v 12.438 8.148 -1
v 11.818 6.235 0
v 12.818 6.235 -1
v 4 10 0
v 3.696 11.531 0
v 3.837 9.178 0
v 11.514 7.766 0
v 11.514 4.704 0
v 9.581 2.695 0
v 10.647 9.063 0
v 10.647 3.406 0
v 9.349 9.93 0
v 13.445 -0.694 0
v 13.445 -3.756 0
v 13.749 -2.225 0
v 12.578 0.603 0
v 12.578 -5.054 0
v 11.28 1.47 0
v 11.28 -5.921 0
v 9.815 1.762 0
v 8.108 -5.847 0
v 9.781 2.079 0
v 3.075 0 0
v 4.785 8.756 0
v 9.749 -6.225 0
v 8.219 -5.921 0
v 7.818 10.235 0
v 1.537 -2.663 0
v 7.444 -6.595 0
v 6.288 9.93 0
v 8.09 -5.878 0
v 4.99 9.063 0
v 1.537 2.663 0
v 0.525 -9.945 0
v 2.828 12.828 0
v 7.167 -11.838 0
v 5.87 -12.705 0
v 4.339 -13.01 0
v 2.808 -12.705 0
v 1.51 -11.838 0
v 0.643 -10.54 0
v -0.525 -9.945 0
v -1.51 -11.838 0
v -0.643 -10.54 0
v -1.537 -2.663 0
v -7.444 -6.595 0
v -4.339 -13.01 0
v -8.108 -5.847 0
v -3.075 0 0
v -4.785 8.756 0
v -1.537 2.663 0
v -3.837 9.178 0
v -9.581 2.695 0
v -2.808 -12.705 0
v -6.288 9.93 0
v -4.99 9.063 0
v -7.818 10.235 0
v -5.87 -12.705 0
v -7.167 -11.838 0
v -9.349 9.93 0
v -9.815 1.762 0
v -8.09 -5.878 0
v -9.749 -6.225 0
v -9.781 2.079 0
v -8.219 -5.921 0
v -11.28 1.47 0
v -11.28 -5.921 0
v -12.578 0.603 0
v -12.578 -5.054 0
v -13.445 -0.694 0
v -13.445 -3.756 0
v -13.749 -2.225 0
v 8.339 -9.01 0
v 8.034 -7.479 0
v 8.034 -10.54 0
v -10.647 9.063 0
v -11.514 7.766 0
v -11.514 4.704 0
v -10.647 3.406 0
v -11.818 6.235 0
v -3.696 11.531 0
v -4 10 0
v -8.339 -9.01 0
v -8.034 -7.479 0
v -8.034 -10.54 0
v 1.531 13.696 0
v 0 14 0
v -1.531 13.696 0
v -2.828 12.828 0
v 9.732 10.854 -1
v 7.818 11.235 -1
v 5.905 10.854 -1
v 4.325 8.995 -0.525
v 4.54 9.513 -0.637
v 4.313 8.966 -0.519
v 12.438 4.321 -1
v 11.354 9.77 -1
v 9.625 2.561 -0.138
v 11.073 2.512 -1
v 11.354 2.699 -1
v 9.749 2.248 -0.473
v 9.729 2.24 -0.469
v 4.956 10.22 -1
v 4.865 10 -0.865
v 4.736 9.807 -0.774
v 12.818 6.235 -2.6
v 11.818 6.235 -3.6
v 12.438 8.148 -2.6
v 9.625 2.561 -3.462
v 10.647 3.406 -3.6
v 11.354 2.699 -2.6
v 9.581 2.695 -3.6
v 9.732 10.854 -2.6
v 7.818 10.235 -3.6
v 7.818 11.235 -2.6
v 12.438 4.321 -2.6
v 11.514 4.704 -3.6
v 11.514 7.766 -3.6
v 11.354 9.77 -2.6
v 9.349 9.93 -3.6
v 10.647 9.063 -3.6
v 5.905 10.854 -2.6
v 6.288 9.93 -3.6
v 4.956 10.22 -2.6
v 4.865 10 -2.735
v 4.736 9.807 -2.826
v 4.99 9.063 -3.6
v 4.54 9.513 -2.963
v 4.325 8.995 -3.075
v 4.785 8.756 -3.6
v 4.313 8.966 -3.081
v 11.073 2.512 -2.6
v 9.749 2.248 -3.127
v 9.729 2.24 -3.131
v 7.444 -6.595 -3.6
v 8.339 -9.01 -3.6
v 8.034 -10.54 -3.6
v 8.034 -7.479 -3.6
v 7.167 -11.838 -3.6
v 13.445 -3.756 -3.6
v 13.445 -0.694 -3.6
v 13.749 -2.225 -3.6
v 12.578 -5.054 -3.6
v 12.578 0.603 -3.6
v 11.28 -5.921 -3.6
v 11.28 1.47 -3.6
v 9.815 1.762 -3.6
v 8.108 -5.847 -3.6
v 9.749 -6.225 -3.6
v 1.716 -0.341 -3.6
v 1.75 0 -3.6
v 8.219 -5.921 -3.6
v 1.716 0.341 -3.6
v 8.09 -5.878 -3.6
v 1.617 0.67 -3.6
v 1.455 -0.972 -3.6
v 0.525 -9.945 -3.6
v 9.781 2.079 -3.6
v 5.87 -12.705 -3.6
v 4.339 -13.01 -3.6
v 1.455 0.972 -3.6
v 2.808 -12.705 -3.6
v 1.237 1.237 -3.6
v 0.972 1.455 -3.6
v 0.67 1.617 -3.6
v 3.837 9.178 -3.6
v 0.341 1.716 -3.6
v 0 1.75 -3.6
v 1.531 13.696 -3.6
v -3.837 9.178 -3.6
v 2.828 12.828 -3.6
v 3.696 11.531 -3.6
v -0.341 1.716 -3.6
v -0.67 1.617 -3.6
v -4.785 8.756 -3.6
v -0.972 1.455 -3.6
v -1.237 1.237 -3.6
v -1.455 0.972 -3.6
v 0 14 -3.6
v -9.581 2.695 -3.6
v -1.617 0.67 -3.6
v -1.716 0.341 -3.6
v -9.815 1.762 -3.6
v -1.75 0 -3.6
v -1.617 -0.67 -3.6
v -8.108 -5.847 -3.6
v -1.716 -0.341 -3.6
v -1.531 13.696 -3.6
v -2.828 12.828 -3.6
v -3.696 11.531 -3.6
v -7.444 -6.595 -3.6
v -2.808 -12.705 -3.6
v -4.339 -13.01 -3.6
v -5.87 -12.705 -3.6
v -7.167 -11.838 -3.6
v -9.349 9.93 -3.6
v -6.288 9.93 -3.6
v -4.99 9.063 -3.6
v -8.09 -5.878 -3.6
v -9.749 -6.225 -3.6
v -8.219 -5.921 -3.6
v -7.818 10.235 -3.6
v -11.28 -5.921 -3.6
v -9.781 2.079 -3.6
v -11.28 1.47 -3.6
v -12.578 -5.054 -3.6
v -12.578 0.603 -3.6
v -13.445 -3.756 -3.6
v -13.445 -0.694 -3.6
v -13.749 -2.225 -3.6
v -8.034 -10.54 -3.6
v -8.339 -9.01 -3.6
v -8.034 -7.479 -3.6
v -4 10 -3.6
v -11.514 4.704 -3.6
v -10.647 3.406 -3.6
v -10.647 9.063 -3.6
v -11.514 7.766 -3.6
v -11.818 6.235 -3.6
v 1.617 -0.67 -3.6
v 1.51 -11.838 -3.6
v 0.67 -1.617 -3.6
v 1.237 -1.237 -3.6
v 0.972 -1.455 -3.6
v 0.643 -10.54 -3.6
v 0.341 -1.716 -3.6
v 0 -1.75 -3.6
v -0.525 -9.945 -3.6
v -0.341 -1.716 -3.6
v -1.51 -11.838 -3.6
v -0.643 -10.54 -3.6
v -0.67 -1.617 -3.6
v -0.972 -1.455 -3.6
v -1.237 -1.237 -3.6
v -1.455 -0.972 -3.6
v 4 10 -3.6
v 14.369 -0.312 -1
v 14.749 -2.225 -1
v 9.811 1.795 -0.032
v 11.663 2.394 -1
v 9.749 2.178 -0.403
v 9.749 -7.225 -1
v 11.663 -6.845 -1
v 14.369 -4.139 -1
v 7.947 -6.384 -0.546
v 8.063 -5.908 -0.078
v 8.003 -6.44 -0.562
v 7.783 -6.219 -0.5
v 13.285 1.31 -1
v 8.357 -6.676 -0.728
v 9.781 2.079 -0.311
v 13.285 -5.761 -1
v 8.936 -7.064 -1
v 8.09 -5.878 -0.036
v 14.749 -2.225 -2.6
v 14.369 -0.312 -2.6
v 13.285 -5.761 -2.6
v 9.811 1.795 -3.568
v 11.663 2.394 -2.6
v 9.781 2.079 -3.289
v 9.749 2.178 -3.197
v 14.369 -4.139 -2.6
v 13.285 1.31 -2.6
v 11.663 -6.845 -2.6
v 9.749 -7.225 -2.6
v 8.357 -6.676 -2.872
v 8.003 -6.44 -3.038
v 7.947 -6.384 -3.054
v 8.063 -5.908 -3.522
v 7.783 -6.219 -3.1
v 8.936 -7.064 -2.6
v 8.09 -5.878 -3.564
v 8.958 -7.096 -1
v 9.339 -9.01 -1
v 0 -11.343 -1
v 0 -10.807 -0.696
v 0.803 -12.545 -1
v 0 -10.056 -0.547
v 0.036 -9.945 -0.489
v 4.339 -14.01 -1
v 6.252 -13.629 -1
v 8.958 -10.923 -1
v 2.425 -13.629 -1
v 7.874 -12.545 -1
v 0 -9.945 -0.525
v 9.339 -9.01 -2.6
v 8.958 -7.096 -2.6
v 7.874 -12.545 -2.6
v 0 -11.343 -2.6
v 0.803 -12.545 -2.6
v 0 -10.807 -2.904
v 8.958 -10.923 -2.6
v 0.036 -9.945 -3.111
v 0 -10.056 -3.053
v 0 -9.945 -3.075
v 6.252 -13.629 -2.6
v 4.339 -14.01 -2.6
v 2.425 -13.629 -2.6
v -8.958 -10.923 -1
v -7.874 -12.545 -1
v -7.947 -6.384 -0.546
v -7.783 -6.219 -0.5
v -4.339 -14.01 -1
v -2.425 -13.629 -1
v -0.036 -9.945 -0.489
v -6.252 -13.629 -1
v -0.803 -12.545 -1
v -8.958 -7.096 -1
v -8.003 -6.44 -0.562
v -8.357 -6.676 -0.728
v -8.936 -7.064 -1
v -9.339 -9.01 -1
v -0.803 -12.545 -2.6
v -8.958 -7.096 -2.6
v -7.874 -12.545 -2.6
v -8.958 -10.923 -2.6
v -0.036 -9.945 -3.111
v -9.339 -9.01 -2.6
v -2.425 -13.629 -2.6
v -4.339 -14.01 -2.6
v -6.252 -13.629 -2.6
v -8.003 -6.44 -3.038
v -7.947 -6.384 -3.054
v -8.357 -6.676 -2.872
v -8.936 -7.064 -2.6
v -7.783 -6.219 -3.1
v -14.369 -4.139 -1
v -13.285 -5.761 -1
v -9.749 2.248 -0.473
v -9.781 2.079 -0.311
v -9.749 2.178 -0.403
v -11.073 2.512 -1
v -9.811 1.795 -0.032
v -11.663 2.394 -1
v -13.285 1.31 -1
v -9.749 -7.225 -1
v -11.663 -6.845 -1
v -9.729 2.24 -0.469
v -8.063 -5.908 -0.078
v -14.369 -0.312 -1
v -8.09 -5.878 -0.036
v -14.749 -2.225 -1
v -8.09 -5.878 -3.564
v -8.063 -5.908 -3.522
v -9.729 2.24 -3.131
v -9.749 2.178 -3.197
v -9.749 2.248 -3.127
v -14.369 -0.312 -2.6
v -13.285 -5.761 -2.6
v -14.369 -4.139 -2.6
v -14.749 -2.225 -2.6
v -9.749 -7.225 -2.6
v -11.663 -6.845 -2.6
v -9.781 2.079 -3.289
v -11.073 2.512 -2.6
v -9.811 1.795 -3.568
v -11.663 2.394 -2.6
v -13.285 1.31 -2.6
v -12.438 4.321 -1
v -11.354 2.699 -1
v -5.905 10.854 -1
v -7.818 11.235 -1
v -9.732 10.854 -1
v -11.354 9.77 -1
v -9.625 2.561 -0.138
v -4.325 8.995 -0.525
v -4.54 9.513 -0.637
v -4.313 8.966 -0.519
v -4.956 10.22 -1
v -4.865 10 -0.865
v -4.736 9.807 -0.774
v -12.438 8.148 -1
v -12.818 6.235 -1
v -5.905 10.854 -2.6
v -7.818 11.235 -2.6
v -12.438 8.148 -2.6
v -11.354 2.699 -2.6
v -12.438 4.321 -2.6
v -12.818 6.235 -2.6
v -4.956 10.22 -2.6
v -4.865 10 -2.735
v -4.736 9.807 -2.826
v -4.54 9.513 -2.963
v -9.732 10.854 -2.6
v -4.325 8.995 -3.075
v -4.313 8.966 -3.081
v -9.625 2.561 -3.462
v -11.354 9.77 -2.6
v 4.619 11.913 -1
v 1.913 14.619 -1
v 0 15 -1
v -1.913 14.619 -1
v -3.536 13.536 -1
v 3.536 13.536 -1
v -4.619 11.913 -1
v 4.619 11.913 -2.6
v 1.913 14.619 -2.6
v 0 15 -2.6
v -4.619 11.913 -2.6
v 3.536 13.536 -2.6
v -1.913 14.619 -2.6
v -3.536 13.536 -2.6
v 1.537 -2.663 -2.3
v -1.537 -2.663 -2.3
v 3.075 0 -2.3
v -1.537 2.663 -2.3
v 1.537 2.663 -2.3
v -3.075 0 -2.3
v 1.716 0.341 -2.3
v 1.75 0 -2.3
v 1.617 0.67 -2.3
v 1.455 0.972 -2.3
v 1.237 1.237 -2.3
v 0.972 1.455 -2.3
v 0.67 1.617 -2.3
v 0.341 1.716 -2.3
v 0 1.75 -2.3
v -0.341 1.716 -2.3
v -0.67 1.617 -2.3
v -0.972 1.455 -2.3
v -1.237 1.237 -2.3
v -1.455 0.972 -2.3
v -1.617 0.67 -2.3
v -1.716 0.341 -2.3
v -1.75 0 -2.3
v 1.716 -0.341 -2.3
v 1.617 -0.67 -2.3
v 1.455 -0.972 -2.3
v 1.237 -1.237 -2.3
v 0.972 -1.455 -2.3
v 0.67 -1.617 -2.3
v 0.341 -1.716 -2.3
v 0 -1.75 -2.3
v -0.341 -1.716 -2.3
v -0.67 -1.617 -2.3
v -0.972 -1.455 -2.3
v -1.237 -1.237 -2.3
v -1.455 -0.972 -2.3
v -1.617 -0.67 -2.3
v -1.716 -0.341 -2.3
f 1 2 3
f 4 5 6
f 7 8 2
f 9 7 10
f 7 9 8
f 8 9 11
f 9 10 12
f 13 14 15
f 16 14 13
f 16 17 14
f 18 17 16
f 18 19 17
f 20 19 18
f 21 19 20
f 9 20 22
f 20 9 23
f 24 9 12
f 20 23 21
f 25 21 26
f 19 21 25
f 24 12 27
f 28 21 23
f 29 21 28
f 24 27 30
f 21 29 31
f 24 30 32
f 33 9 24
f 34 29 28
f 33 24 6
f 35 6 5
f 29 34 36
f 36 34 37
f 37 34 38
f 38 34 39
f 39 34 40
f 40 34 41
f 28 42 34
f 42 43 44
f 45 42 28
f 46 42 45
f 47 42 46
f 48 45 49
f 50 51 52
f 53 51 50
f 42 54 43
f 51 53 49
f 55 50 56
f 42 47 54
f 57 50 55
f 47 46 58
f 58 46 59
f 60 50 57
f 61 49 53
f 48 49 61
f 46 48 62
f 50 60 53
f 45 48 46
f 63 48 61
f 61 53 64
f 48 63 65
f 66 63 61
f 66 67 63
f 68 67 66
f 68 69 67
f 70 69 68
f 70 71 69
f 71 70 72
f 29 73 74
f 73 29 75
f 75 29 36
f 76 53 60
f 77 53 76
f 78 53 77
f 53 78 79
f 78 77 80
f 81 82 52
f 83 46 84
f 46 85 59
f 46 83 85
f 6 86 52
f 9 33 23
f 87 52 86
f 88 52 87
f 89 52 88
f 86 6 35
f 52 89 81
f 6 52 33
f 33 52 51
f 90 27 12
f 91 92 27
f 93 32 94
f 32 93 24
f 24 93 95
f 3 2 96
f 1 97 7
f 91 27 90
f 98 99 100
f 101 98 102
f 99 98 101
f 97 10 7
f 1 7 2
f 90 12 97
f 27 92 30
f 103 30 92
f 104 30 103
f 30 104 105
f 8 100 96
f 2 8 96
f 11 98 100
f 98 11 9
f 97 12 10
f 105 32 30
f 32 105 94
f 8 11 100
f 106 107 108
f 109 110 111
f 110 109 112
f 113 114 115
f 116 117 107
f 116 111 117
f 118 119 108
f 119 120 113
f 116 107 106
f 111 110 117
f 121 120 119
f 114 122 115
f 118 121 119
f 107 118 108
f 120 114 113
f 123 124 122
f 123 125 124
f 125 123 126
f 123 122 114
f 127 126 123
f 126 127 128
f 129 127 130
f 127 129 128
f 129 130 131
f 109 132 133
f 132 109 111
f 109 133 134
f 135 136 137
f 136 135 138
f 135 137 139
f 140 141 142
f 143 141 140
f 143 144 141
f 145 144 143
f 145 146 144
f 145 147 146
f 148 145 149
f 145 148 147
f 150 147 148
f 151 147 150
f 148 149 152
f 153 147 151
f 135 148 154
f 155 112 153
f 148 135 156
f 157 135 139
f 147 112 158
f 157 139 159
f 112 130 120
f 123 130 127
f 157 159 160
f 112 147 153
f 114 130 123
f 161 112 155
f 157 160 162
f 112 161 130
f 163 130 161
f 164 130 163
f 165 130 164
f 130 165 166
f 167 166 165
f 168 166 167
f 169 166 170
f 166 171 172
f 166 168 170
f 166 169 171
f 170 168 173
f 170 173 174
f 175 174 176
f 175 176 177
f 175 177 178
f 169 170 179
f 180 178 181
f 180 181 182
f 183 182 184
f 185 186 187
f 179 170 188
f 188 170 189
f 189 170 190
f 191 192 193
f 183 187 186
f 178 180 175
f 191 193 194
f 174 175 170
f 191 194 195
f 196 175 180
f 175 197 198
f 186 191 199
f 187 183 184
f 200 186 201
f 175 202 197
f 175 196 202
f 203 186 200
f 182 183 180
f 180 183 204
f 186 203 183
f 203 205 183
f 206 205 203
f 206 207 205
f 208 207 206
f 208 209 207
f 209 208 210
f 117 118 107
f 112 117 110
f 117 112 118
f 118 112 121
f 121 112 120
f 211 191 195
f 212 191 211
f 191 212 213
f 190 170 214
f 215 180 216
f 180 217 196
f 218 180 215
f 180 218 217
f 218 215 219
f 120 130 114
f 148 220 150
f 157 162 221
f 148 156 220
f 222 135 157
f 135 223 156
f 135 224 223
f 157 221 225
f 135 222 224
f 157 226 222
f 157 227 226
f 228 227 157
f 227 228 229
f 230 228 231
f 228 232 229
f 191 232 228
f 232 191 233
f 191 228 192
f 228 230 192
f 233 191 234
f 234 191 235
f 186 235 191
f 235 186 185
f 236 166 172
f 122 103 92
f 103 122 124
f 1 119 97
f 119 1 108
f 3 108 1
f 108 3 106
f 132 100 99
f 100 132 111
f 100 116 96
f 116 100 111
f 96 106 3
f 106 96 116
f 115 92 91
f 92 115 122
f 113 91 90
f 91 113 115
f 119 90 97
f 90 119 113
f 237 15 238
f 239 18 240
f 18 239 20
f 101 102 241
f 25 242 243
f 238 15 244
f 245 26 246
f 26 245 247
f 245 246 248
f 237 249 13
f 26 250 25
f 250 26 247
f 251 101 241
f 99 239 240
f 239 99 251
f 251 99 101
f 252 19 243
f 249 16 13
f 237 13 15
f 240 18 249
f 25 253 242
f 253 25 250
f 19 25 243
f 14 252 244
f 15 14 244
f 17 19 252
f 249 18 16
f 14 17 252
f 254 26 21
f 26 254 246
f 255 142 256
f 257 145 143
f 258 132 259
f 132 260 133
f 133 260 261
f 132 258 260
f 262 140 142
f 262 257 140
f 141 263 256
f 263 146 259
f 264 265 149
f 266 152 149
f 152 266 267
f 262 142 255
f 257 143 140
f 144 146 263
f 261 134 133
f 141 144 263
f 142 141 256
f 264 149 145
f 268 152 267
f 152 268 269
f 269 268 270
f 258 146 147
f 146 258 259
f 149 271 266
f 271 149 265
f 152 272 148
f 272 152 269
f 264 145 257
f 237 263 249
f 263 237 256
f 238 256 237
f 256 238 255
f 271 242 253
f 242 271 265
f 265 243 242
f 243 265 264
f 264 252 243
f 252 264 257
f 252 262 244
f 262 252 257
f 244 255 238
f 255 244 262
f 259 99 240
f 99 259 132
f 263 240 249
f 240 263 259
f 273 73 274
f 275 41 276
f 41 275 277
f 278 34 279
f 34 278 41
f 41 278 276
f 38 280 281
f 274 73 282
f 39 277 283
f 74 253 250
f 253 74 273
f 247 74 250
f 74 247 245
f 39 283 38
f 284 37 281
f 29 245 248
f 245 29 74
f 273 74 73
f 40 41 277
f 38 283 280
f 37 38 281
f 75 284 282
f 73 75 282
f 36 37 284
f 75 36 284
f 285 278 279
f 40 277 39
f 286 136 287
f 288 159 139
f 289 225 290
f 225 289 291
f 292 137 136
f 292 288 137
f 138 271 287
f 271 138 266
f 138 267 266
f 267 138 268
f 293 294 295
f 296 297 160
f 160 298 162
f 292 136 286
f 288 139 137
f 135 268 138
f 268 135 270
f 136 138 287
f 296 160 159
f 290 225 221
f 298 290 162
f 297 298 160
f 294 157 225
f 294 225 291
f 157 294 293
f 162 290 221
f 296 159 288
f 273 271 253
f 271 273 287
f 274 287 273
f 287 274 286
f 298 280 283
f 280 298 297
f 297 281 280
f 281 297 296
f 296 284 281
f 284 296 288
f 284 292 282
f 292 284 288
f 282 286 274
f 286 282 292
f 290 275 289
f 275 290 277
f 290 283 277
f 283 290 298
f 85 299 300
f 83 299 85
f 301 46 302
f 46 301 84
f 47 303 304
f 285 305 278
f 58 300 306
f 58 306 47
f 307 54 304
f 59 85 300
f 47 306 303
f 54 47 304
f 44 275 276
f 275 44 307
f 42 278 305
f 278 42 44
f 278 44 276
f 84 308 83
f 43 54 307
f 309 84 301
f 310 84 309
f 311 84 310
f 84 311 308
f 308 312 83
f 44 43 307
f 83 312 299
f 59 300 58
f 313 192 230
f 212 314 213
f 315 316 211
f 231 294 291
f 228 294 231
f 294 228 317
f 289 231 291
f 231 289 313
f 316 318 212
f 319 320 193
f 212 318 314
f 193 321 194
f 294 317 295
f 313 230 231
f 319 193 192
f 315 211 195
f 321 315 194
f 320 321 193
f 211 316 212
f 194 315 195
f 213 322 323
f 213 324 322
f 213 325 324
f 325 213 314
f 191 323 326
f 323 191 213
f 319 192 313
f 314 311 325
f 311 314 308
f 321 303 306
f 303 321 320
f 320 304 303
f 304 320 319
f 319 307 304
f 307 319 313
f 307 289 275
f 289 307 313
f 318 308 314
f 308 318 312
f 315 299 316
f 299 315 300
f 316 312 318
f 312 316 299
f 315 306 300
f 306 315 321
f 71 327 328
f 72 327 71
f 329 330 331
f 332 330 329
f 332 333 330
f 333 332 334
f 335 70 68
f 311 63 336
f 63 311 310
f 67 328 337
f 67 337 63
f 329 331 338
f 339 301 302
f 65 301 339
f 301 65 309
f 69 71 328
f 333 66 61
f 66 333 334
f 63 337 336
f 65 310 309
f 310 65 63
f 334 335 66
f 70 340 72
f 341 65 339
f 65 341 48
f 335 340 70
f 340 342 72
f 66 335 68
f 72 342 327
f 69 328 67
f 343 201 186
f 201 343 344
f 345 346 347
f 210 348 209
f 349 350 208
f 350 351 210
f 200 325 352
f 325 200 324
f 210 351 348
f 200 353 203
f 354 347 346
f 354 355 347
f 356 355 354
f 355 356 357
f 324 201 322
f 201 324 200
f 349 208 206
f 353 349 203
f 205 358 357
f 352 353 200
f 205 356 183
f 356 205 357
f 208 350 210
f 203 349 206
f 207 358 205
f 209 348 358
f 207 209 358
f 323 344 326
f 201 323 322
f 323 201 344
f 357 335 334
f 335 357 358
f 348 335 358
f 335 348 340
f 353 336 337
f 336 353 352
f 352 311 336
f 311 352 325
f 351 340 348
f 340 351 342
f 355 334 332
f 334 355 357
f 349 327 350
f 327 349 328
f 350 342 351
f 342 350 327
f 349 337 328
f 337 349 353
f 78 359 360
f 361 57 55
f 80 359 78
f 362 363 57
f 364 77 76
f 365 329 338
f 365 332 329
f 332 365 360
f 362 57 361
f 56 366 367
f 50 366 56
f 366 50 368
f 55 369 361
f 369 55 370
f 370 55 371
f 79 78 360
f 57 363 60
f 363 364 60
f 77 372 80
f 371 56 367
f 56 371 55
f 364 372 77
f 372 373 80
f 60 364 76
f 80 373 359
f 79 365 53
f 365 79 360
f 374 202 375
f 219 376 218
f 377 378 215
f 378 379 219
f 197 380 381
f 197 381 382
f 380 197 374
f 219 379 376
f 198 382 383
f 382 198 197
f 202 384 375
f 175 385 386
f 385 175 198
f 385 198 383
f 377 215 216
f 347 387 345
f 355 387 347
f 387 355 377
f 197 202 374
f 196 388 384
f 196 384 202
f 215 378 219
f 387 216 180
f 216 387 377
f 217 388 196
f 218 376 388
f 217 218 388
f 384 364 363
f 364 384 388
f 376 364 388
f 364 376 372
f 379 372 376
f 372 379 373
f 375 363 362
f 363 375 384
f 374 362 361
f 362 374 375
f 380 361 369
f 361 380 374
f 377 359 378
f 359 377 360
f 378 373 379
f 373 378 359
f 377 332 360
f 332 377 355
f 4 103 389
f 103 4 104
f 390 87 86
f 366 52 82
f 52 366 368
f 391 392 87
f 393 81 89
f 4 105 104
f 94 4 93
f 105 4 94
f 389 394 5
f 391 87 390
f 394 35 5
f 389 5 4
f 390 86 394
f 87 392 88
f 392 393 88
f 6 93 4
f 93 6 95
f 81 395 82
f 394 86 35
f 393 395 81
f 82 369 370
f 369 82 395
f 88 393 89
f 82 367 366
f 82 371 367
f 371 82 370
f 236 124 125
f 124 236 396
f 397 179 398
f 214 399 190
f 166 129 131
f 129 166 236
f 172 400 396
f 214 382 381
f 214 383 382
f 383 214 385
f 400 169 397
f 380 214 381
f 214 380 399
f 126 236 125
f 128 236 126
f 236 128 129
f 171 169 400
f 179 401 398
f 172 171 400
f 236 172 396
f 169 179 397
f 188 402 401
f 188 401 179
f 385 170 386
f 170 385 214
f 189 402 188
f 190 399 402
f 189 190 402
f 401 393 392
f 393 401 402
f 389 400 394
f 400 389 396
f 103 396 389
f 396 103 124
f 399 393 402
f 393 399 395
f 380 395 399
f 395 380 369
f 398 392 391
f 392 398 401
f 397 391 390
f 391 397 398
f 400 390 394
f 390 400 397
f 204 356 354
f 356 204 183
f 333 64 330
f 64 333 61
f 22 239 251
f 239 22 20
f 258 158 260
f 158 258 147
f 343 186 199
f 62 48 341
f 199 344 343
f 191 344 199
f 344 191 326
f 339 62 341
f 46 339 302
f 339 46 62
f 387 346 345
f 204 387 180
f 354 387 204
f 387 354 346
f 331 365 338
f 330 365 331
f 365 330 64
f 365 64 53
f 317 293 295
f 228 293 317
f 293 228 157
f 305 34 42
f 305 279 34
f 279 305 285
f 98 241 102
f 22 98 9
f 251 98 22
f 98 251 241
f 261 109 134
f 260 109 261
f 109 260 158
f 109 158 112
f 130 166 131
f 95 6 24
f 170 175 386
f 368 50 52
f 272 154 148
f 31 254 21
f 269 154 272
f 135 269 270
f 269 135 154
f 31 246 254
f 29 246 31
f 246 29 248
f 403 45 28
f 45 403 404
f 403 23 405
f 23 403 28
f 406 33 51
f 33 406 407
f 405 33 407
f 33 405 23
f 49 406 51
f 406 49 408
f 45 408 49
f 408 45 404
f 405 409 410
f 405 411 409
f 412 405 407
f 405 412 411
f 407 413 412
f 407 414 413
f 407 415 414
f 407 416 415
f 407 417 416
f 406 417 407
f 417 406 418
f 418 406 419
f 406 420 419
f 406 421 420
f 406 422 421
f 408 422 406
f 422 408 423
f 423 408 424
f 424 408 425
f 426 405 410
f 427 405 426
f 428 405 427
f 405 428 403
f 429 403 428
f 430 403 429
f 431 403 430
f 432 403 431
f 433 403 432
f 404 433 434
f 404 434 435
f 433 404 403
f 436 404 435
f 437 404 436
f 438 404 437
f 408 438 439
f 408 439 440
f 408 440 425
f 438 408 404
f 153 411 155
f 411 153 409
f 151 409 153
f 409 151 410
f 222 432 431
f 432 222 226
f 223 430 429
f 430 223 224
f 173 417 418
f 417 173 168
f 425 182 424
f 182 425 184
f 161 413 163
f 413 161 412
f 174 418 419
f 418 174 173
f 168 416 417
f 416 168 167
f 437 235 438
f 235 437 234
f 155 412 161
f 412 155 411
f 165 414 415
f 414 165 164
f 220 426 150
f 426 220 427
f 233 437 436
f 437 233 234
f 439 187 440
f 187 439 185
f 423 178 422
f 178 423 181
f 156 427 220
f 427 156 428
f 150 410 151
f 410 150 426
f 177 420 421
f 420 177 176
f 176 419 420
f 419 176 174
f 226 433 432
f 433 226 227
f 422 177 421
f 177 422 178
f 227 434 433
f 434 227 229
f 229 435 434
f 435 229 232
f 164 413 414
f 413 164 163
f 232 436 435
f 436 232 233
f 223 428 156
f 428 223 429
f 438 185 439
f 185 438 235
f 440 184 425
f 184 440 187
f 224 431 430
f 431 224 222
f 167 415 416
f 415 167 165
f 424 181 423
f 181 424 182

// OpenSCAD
module turnHandle(r=5,R=20,N=5,h=5,cd=1){
    translate([0,0,-h/2]){
        cylinder(r=R,h=h,center=true);
        for(i=[1:N]){
            a=i*360/N;
            translate([R*sin(a),R*cos(a),0]) {
                
                for(mZ=[0,1]) {
                    mirror([0,0,mZ])
                    translate([0,0,h/2-cd/2])
                    cylinder(r1=r,r2=r-cd,h=cd,center=true);
                }
                cylinder(r=r,h=h-2*cd,center=true);
            }
        }
    }
}




module thumbWheel(X=5.5,D_AXLE=3.5,PD=2.3,H=3.6) {
    

    D=sqrt( (X/2)*(X/2) +(X/4)*(X/4))*2;

    difference() {
        turnHandle(R=10,N=7,h=H);
        cylinder($fn=6,d=D,h=2*PD,center=true);
        cylinder($fn=32,d=D_AXLE,h=3*H,center=true);
    }
}
mode="m3";

if(mode=="m3") {
    thumbWheel();
}
